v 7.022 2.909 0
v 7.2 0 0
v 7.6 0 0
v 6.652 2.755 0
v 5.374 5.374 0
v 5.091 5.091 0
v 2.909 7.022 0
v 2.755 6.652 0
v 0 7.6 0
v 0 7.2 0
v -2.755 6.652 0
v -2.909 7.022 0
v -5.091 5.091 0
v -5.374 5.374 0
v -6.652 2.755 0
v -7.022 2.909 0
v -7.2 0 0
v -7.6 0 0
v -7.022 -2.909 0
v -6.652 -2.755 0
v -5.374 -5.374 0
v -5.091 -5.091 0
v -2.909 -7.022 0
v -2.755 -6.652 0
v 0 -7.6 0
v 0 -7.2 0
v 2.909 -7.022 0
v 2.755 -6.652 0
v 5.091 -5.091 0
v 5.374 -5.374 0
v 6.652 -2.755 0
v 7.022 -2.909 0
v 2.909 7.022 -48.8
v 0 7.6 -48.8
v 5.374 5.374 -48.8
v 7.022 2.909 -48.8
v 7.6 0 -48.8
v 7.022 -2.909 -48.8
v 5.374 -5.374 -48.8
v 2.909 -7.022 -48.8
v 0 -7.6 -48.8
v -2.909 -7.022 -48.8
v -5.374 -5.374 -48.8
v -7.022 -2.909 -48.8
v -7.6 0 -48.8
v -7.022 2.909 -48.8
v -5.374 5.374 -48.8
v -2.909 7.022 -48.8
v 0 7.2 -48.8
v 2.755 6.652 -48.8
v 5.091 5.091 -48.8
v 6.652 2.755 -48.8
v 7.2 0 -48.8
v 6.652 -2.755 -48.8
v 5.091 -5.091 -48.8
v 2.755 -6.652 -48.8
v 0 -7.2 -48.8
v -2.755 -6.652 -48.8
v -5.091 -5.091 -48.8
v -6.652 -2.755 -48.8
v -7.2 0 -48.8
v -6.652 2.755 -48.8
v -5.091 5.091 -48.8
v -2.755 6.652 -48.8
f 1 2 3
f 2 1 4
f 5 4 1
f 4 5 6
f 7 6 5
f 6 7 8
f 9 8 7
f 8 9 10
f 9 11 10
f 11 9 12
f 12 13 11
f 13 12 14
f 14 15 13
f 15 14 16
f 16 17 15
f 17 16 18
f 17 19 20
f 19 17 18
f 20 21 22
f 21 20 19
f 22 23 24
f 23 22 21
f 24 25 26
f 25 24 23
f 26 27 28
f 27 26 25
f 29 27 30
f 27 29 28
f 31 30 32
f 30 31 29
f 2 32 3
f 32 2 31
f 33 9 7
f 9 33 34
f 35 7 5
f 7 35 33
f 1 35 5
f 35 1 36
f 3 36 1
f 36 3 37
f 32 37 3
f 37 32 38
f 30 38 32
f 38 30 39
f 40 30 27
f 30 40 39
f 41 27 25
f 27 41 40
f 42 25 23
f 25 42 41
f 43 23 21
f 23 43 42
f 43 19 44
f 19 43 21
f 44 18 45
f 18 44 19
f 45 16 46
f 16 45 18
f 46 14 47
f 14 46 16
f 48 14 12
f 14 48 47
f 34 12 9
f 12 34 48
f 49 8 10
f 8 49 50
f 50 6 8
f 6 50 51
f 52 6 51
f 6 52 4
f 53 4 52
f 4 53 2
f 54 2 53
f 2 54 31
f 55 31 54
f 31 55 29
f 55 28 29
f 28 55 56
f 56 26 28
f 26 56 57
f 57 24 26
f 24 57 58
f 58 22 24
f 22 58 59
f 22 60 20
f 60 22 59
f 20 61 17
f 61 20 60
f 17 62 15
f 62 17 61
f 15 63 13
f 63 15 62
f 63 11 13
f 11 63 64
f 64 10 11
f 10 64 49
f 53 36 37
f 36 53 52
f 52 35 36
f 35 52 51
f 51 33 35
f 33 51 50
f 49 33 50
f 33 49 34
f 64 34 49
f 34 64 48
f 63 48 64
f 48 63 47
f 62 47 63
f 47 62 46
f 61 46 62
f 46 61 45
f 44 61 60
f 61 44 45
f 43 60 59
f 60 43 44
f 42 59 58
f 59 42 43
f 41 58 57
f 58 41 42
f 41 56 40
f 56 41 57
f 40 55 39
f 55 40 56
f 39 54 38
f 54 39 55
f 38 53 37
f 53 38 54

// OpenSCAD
// file: ../p/4-4rin18.scad
use <../lib.scad>
function ldraw_lib__4_4rin18() = [
// 0 Ring 18 x 1.0
// 0 Name: 4-4rin18.dat
// 0 Author: Guy Vivan [guyvivan]
// 0 !LDRAW_ORG Primitive UPDATE 2009-03
// 0 !LICENSE Licensed under CC BY 2.0 and CC BY 4.0 : see CAreadme.txt
// 
// 0 BFC CERTIFY CCW
  [0,"BFC","CERTIFY"],
  [0,"BFC","CCW"],
// 
// 0 !HISTORY 2009-12-29 [PTadmin] Official Update 2009-03
// 
// 
// 4 16 18 0 0 19 0 0 17.5541 0 7.2713 16.6302 0 6.8886
  [4,16,18,0,0,19,0,0,17.5541,0,7.2713,16.6302,0,6.8886],
// 4 16 16.6302 0 6.8886 17.5541 0 7.2713 13.4349 0 13.4349 12.7278 0 12.7278
  [4,16,16.6302,0,6.8886,17.5541,0,7.2713,13.4349,0,13.4349,12.7278,0,12.7278],
// 4 16 12.7278 0 12.7278 13.4349 0 13.4349 7.2713 0 17.5541 6.8886 0 16.6302
  [4,16,12.7278,0,12.7278,13.4349,0,13.4349,7.2713,0,17.5541,6.8886,0,16.6302],
// 4 16 6.8886 0 16.6302 7.2713 0 17.5541 0 0 19 0 0 18
  [4,16,6.8886,0,16.6302,7.2713,0,17.5541,0,0,19,0,0,18],
// 4 16 0 0 18 0 0 19 -7.2713 0 17.5541 -6.8886 0 16.6302
  [4,16,0,0,18,0,0,19,-7.2713,0,17.5541,-6.8886,0,16.6302],
// 4 16 -6.8886 0 16.6302 -7.2713 0 17.5541 -13.4349 0 13.4349 -12.7278 0 12.7278
  [4,16,-6.8886,0,16.6302,-7.2713,0,17.5541,-13.4349,0,13.4349,-12.7278,0,12.7278],
// 4 16 -12.7278 0 12.7278 -13.4349 0 13.4349 -17.5541 0 7.2713 -16.6302 0 6.8886
  [4,16,-12.7278,0,12.7278,-13.4349,0,13.4349,-17.5541,0,7.2713,-16.6302,0,6.8886],
// 4 16 -16.6302 0 6.8886 -17.5541 0 7.2713 -19 0 0 -18 0 0
  [4,16,-16.6302,0,6.8886,-17.5541,0,7.2713,-19,0,0,-18,0,0],
// 4 16 -18 0 0 -19 0 0 -17.5541 0 -7.2713 -16.6302 0 -6.8886
  [4,16,-18,0,0,-19,0,0,-17.5541,0,-7.2713,-16.6302,0,-6.8886],
// 4 16 -16.6302 0 -6.8886 -17.5541 0 -7.2713 -13.4349 0 -13.4349 -12.7278 0 -12.7278
  [4,16,-16.6302,0,-6.8886,-17.5541,0,-7.2713,-13.4349,0,-13.4349,-12.7278,0,-12.7278],
// 4 16 -12.7278 0 -12.7278 -13.4349 0 -13.4349 -7.2713 0 -17.5541 -6.8886 0 -16.6302
  [4,16,-12.7278,0,-12.7278,-13.4349,0,-13.4349,-7.2713,0,-17.5541,-6.8886,0,-16.6302],
// 4 16 -6.8886 0 -16.6302 -7.2713 0 -17.5541 0 0 -19 0 0 -18
  [4,16,-6.8886,0,-16.6302,-7.2713,0,-17.5541,0,0,-19,0,0,-18],
// 4 16 0 0 -18 0 0 -19 7.2713 0 -17.5541 6.8886 0 -16.6302
  [4,16,0,0,-18,0,0,-19,7.2713,0,-17.5541,6.8886,0,-16.6302],
// 4 16 6.8886 0 -16.6302 7.2713 0 -17.5541 13.4349 0 -13.4349 12.7278 0 -12.7278
  [4,16,6.8886,0,-16.6302,7.2713,0,-17.5541,13.4349,0,-13.4349,12.7278,0,-12.7278],
// 4 16 12.7278 0 -12.7278 13.4349 0 -13.4349 17.5541 0 -7.2713 16.6302 0 -6.8886
  [4,16,12.7278,0,-12.7278,13.4349,0,-13.4349,17.5541,0,-7.2713,16.6302,0,-6.8886],
// 4 16 16.6302 0 -6.8886 17.5541 0 -7.2713 19 0 0 18 0 0
  [4,16,16.6302,0,-6.8886,17.5541,0,-7.2713,19,0,0,18,0,0],
// 
// 0 end of file
// 
];
module ldraw_lib__4_4rin18(step=0, col=false, unit=2/5, alt=false, line=0.2, solid=!$preview)
    makepoly(ldraw_lib__4_4rin18(), step=step, col=col, unit=unit, alt=alt, line=line, solid=solid);
ldraw_lib__4_4rin18(line=0.2);
// file: ../p/4-4edge.scad
use <../lib.scad>
function ldraw_lib__4_4edge() = [
// 0 Circle 1.0
// 0 Name: 4-4edge.dat
// 0 Author: James Jessiman
// 0 !LDRAW_ORG Primitive UPDATE 2017-01
// 0 !LICENSE Licensed under CC BY 4.0 : see CAreadme.txt
// 
// 0 BFC CERTIFY CCW
  [0,"BFC","CERTIFY"],
  [0,"BFC","CCW"],
// 
// 0 !HISTORY 1998-12-15 [PTadmin] Official Update 1998-10
// 0 !HISTORY 2005-12-28 [PTadmin] Official Update 2005-01
// 0 !HISTORY 2007-06-24 [PTadmin] Header formatted for Contributor Agreement
// 0 !HISTORY 2008-07-01 [PTadmin] Official Update 2008-01
// 0 !HISTORY 2017-01-15 [Steffen] BFCed
// 0 !HISTORY 2017-12-30 [PTadmin] Official Update 2017-01
// 
// 
// 2 24 1 0 0 0.9239 0 0.3827
  [2,24,1,0,0,0.9239,0,0.3827],
// 2 24 0.9239 0 0.3827 0.7071 0 0.7071
  [2,24,0.9239,0,0.3827,0.7071,0,0.7071],
// 2 24 0.7071 0 0.7071 0.3827 0 0.9239
  [2,24,0.7071,0,0.7071,0.3827,0,0.9239],
// 2 24 0.3827 0 0.9239 0 0 1
  [2,24,0.3827,0,0.9239,0,0,1],
// 2 24 0 0 1 -0.3827 0 0.9239
  [2,24,0,0,1,-0.3827,0,0.9239],
// 2 24 -0.3827 0 0.9239 -0.7071 0 0.7071
  [2,24,-0.3827,0,0.9239,-0.7071,0,0.7071],
// 2 24 -0.7071 0 0.7071 -0.9239 0 0.3827
  [2,24,-0.7071,0,0.7071,-0.9239,0,0.3827],
// 2 24 -0.9239 0 0.3827 -1 0 -0
  [2,24,-0.9239,0,0.3827,-1,0,-0],
// 2 24 -1 0 -0 -0.9239 0 -0.3827
  [2,24,-1,0,-0,-0.9239,0,-0.3827],
// 2 24 -0.9239 0 -0.3827 -0.7071 0 -0.7071
  [2,24,-0.9239,0,-0.3827,-0.7071,0,-0.7071],
// 2 24 -0.7071 0 -0.7071 -0.3827 0 -0.9239
  [2,24,-0.7071,0,-0.7071,-0.3827,0,-0.9239],
// 2 24 -0.3827 0 -0.9239 0 0 -1
  [2,24,-0.3827,0,-0.9239,0,0,-1],
// 2 24 0 0 -1 0.3827 0 -0.9239
  [2,24,0,0,-1,0.3827,0,-0.9239],
// 2 24 0.3827 0 -0.9239 0.7071 0 -0.7071
  [2,24,0.3827,0,-0.9239,0.7071,0,-0.7071],
// 2 24 0.7071 0 -0.7071 0.9239 0 -0.3827
  [2,24,0.7071,0,-0.7071,0.9239,0,-0.3827],
// 2 24 0.9239 0 -0.3827 1 0 0
  [2,24,0.9239,0,-0.3827,1,0,0],
];
module ldraw_lib__4_4edge(step=0, col=false, unit=2/5, alt=false, line=0.2, solid=!$preview)
    makepoly(ldraw_lib__4_4edge(), step=step, col=col, unit=unit, alt=alt, line=line, solid=solid);
ldraw_lib__4_4edge(line=0.2);
// file: ../p/4-4cyli.scad
use <../lib.scad>
function ldraw_lib__4_4cyli() = [
// 0 Cylinder 1.0
// 0 Name: 4-4cyli.dat
// 0 Author: James Jessiman
// 0 !LDRAW_ORG Primitive UPDATE 2005-01
// 0 !LICENSE Licensed under CC BY 4.0 : see CAreadme.txt
// 
// 0 BFC CERTIFY CCW
  [0,"BFC","CERTIFY"],
  [0,"BFC","CCW"],
// 
// 0 !HISTORY 1998-12-15 [PTadmin] Official Update 1998-10
// 0 !HISTORY 2002-03-23 [sbliss] Added BFC statement; merged headers from files in distributions LDraw 0.27 and Complete.
// 0 !HISTORY 2002-04-25 [PTadmin] Official Update 2002-02
// 0 !HISTORY 2004-12-14 [guyvivan] BFC CCW
// 0 !HISTORY 2005-12-28 [PTadmin] Official Update 2005-01
// 0 !HISTORY 2007-06-24 [PTadmin] Header formatted for Contributor Agreement
// 0 !HISTORY 2008-07-01 [PTadmin] Official Update 2008-01
// 
// 
// 4 16 1 1 0 0.9239 1 0.3827 0.9239 0 0.3827 1 0 0
  [4,16,1,1,0,0.9239,1,0.3827,0.9239,0,0.3827,1,0,0],
// 5 24 1 0 0 1 1 0 0.9239 0 0.3827 0.9239 0 -0.3827
  [5,24,1,0,0,1,1,0,0.9239,0,0.3827,0.9239,0,-0.3827],
// 4 16 0.9239 1 0.3827 0.7071 1 0.7071 0.7071 0 0.7071 0.9239 0 0.3827
  [4,16,0.9239,1,0.3827,0.7071,1,0.7071,0.7071,0,0.7071,0.9239,0,0.3827],
// 5 24 0.9239 0 0.3827 0.9239 1 0.3827 0.7071 0 0.7071 1 0 0
  [5,24,0.9239,0,0.3827,0.9239,1,0.3827,0.7071,0,0.7071,1,0,0],
// 4 16 0.7071 1 0.7071 0.3827 1 0.9239 0.3827 0 0.9239 0.7071 0 0.7071
  [4,16,0.7071,1,0.7071,0.3827,1,0.9239,0.3827,0,0.9239,0.7071,0,0.7071],
// 5 24 0.7071 0 0.7071 0.7071 1 0.7071 0.3827 0 0.9239 0.9239 0 0.3827
  [5,24,0.7071,0,0.7071,0.7071,1,0.7071,0.3827,0,0.9239,0.9239,0,0.3827],
// 4 16 0.3827 1 0.9239 0 1 1 0 0 1 0.3827 0 0.9239
  [4,16,0.3827,1,0.9239,0,1,1,0,0,1,0.3827,0,0.9239],
// 5 24 0.3827 0 0.9239 0.3827 1 0.9239 0 0 1 0.7071 0 0.7071
  [5,24,0.3827,0,0.9239,0.3827,1,0.9239,0,0,1,0.7071,0,0.7071],
// 4 16 0 1 1 -0.3827 1 0.9239 -0.3827 0 0.9239 0 0 1
  [4,16,0,1,1,-0.3827,1,0.9239,-0.3827,0,0.9239,0,0,1],
// 5 24 0 0 1 0 1 1 -0.3827 0 0.9239 0.3827 0 0.9239
  [5,24,0,0,1,0,1,1,-0.3827,0,0.9239,0.3827,0,0.9239],
// 4 16 -0.3827 1 0.9239 -0.7071 1 0.7071 -0.7071 0 0.7071 -0.3827 0 0.9239
  [4,16,-0.3827,1,0.9239,-0.7071,1,0.7071,-0.7071,0,0.7071,-0.3827,0,0.9239],
// 5 24 -0.3827 0 0.9239 -0.3827 1 0.9239 -0.7071 0 0.7071 0 0 1
  [5,24,-0.3827,0,0.9239,-0.3827,1,0.9239,-0.7071,0,0.7071,0,0,1],
// 4 16 -0.7071 1 0.7071 -0.9239 1 0.3827 -0.9239 0 0.3827 -0.7071 0 0.7071
  [4,16,-0.7071,1,0.7071,-0.9239,1,0.3827,-0.9239,0,0.3827,-0.7071,0,0.7071],
// 5 24 -0.7071 0 0.7071 -0.7071 1 0.7071 -0.9239 0 0.3827 -0.3827 0 0.9239
  [5,24,-0.7071,0,0.7071,-0.7071,1,0.7071,-0.9239,0,0.3827,-0.3827,0,0.9239],
// 4 16 -0.9239 1 0.3827 -1 1 0 -1 0 0 -0.9239 0 0.3827
  [4,16,-0.9239,1,0.3827,-1,1,0,-1,0,0,-0.9239,0,0.3827],
// 5 24 -0.9239 0 0.3827 -0.9239 1 0.3827 -1 0 0 -0.7071 0 0.7071
  [5,24,-0.9239,0,0.3827,-0.9239,1,0.3827,-1,0,0,-0.7071,0,0.7071],
// 4 16 -1 1 0 -0.9239 1 -0.3827 -0.9239 0 -0.3827 -1 0 0
  [4,16,-1,1,0,-0.9239,1,-0.3827,-0.9239,0,-0.3827,-1,0,0],
// 5 24 -1 0 0 -1 1 0 -0.9239 0 -0.3827 -0.9239 0 0.3827
  [5,24,-1,0,0,-1,1,0,-0.9239,0,-0.3827,-0.9239,0,0.3827],
// 4 16 -0.9239 1 -0.3827 -0.7071 1 -0.7071 -0.7071 0 -0.7071 -0.9239 0 -0.3827
  [4,16,-0.9239,1,-0.3827,-0.7071,1,-0.7071,-0.7071,0,-0.7071,-0.9239,0,-0.3827],
// 5 24 -0.9239 0 -0.3827 -0.9239 1 -0.3827 -0.7071 0 -0.7071 -1 0 0
  [5,24,-0.9239,0,-0.3827,-0.9239,1,-0.3827,-0.7071,0,-0.7071,-1,0,0],
// 4 16 -0.7071 1 -0.7071 -0.3827 1 -0.9239 -0.3827 0 -0.9239 -0.7071 0 -0.7071
  [4,16,-0.7071,1,-0.7071,-0.3827,1,-0.9239,-0.3827,0,-0.9239,-0.7071,0,-0.7071],
// 5 24 -0.7071 0 -0.7071 -0.7071 1 -0.7071 -0.3827 0 -0.9239 -0.9239 0 -0.3827
  [5,24,-0.7071,0,-0.7071,-0.7071,1,-0.7071,-0.3827,0,-0.9239,-0.9239,0,-0.3827],
// 4 16 -0.3827 1 -0.9239 0 1 -1 0 0 -1 -0.3827 0 -0.9239
  [4,16,-0.3827,1,-0.9239,0,1,-1,0,0,-1,-0.3827,0,-0.9239],
// 5 24 -0.3827 0 -0.9239 -0.3827 1 -0.9239 0 0 -1 -0.7071 0 -0.7071
  [5,24,-0.3827,0,-0.9239,-0.3827,1,-0.9239,0,0,-1,-0.7071,0,-0.7071],
// 4 16 0 1 -1 0.3827 1 -0.9239 0.3827 0 -0.9239 0 0 -1
  [4,16,0,1,-1,0.3827,1,-0.9239,0.3827,0,-0.9239,0,0,-1],
// 5 24 0 0 -1 0 1 -1 0.3827 0 -0.9239 -0.3827 0 -0.9239
  [5,24,0,0,-1,0,1,-1,0.3827,0,-0.9239,-0.3827,0,-0.9239],
// 4 16 0.3827 1 -0.9239 0.7071 1 -0.7071 0.7071 0 -0.7071 0.3827 0 -0.9239
  [4,16,0.3827,1,-0.9239,0.7071,1,-0.7071,0.7071,0,-0.7071,0.3827,0,-0.9239],
// 5 24 0.3827 0 -0.9239 0.3827 1 -0.9239 0.7071 0 -0.7071 0 0 -1
  [5,24,0.3827,0,-0.9239,0.3827,1,-0.9239,0.7071,0,-0.7071,0,0,-1],
// 4 16 0.7071 1 -0.7071 0.9239 1 -0.3827 0.9239 0 -0.3827 0.7071 0 -0.7071
  [4,16,0.7071,1,-0.7071,0.9239,1,-0.3827,0.9239,0,-0.3827,0.7071,0,-0.7071],
// 5 24 0.7071 0 -0.7071 0.7071 1 -0.7071 0.9239 0 -0.3827 0.3827 0 -0.9239
  [5,24,0.7071,0,-0.7071,0.7071,1,-0.7071,0.9239,0,-0.3827,0.3827,0,-0.9239],
// 4 16 0.9239 1 -0.3827 1 1 0 1 0 0 0.9239 0 -0.3827
  [4,16,0.9239,1,-0.3827,1,1,0,1,0,0,0.9239,0,-0.3827],
// 5 24 0.9239 0 -0.3827 0.9239 1 -0.3827 1 0 0 0.7071 0 -0.7071
  [5,24,0.9239,0,-0.3827,0.9239,1,-0.3827,1,0,0,0.7071,0,-0.7071],
// 0
];
module ldraw_lib__4_4cyli(step=0, col=false, unit=2/5, alt=false, line=0.2, solid=!$preview)
    makepoly(ldraw_lib__4_4cyli(), step=step, col=col, unit=unit, alt=alt, line=line, solid=solid);
ldraw_lib__4_4cyli(line=0.2);
// main file
use <../lib.scad>
use <../p/4-4cyli.scad>
use <../p/4-4edge.scad>
use <../p/4-4rin18.scad>
function ldraw_lib__335() = [
// 0 ~Technic Pneumatic Cylinder 2 x 2 x 5
// 0 Name: 335.dat
// 0 Author: Marc Klein [marckl]
// 0 !LDRAW_ORG Part UPDATE 2009-03
// 0 !LICENSE Licensed under CC BY 4.0 : see CAreadme.txt
// 
// 0 BFC CERTIFY CCW
  [0,"BFC","CERTIFY"],
  [0,"BFC","CCW"],
// 
// 0 !HISTORY 2006-08-20 [WilliamH] sub-parted
// 0 !HISTORY 2009-12-19 [cwdee] Reworked to comprise cylinder alone
// 0 !HISTORY 2009-12-29 [PTadmin] Official Update 2009-03
// 
// 
// 0 // Needs work: missing internal detail
// 
// 1 16 0 0 0 0 0 18 0 -1 0 18 0 0 4-4edge.dat
  [1,16,0,0,0,0,0,18,0,-1,0,18,0,0, ldraw_lib__4_4edge()],
// 1 16 0 0 0 1 0 0 0 1 0 0 0 1 4-4rin18.dat
  [1,16,0,0,0,1,0,0,0,1,0,0,0,1, ldraw_lib__4_4rin18()],
// 1 16 0 0 0 0 0 19 0 -1 0 19 0 0 4-4edge.dat
  [1,16,0,0,0,0,0,19,0,-1,0,19,0,0, ldraw_lib__4_4edge()],
// 1 16 0 122 0 0 0 19 0 -122 0 19 0 0 4-4cyli.dat
  [1,16,0,122,0,0,0,19,0,-122,0,19,0,0, ldraw_lib__4_4cyli()],
// 0 BFC INVERTNEXT
  [0,"BFC","INVERTNEXT"],
// 1 16 0 122 0 0 0 18 0 -122 0 18 0 0 4-4cyli.dat
  [1,16,0,122,0,0,0,18,0,-122,0,18,0,0, ldraw_lib__4_4cyli()],
// 1 16 0 122 0 0 0 18 0 -1 0 18 0 0 4-4edge.dat
  [1,16,0,122,0,0,0,18,0,-1,0,18,0,0, ldraw_lib__4_4edge()],
// 1 16 0 122 0 1 0 0 0 -1 0 0 0 1 4-4rin18.dat
  [1,16,0,122,0,1,0,0,0,-1,0,0,0,1, ldraw_lib__4_4rin18()],
// 1 16 0 122 0 0 0 19 0 -1 0 19 0 0 4-4edge.dat
  [1,16,0,122,0,0,0,19,0,-1,0,19,0,0, ldraw_lib__4_4edge()],
// 0
// 0
];
module ldraw_lib__335(step=0, col=false, unit=2/5, alt=false, line=0.2, solid=!$preview)
    makepoly(ldraw_lib__335(), step=step, col=col, unit=unit, alt=alt, line=line, solid=solid);
ldraw_lib__335(line=0.2);
